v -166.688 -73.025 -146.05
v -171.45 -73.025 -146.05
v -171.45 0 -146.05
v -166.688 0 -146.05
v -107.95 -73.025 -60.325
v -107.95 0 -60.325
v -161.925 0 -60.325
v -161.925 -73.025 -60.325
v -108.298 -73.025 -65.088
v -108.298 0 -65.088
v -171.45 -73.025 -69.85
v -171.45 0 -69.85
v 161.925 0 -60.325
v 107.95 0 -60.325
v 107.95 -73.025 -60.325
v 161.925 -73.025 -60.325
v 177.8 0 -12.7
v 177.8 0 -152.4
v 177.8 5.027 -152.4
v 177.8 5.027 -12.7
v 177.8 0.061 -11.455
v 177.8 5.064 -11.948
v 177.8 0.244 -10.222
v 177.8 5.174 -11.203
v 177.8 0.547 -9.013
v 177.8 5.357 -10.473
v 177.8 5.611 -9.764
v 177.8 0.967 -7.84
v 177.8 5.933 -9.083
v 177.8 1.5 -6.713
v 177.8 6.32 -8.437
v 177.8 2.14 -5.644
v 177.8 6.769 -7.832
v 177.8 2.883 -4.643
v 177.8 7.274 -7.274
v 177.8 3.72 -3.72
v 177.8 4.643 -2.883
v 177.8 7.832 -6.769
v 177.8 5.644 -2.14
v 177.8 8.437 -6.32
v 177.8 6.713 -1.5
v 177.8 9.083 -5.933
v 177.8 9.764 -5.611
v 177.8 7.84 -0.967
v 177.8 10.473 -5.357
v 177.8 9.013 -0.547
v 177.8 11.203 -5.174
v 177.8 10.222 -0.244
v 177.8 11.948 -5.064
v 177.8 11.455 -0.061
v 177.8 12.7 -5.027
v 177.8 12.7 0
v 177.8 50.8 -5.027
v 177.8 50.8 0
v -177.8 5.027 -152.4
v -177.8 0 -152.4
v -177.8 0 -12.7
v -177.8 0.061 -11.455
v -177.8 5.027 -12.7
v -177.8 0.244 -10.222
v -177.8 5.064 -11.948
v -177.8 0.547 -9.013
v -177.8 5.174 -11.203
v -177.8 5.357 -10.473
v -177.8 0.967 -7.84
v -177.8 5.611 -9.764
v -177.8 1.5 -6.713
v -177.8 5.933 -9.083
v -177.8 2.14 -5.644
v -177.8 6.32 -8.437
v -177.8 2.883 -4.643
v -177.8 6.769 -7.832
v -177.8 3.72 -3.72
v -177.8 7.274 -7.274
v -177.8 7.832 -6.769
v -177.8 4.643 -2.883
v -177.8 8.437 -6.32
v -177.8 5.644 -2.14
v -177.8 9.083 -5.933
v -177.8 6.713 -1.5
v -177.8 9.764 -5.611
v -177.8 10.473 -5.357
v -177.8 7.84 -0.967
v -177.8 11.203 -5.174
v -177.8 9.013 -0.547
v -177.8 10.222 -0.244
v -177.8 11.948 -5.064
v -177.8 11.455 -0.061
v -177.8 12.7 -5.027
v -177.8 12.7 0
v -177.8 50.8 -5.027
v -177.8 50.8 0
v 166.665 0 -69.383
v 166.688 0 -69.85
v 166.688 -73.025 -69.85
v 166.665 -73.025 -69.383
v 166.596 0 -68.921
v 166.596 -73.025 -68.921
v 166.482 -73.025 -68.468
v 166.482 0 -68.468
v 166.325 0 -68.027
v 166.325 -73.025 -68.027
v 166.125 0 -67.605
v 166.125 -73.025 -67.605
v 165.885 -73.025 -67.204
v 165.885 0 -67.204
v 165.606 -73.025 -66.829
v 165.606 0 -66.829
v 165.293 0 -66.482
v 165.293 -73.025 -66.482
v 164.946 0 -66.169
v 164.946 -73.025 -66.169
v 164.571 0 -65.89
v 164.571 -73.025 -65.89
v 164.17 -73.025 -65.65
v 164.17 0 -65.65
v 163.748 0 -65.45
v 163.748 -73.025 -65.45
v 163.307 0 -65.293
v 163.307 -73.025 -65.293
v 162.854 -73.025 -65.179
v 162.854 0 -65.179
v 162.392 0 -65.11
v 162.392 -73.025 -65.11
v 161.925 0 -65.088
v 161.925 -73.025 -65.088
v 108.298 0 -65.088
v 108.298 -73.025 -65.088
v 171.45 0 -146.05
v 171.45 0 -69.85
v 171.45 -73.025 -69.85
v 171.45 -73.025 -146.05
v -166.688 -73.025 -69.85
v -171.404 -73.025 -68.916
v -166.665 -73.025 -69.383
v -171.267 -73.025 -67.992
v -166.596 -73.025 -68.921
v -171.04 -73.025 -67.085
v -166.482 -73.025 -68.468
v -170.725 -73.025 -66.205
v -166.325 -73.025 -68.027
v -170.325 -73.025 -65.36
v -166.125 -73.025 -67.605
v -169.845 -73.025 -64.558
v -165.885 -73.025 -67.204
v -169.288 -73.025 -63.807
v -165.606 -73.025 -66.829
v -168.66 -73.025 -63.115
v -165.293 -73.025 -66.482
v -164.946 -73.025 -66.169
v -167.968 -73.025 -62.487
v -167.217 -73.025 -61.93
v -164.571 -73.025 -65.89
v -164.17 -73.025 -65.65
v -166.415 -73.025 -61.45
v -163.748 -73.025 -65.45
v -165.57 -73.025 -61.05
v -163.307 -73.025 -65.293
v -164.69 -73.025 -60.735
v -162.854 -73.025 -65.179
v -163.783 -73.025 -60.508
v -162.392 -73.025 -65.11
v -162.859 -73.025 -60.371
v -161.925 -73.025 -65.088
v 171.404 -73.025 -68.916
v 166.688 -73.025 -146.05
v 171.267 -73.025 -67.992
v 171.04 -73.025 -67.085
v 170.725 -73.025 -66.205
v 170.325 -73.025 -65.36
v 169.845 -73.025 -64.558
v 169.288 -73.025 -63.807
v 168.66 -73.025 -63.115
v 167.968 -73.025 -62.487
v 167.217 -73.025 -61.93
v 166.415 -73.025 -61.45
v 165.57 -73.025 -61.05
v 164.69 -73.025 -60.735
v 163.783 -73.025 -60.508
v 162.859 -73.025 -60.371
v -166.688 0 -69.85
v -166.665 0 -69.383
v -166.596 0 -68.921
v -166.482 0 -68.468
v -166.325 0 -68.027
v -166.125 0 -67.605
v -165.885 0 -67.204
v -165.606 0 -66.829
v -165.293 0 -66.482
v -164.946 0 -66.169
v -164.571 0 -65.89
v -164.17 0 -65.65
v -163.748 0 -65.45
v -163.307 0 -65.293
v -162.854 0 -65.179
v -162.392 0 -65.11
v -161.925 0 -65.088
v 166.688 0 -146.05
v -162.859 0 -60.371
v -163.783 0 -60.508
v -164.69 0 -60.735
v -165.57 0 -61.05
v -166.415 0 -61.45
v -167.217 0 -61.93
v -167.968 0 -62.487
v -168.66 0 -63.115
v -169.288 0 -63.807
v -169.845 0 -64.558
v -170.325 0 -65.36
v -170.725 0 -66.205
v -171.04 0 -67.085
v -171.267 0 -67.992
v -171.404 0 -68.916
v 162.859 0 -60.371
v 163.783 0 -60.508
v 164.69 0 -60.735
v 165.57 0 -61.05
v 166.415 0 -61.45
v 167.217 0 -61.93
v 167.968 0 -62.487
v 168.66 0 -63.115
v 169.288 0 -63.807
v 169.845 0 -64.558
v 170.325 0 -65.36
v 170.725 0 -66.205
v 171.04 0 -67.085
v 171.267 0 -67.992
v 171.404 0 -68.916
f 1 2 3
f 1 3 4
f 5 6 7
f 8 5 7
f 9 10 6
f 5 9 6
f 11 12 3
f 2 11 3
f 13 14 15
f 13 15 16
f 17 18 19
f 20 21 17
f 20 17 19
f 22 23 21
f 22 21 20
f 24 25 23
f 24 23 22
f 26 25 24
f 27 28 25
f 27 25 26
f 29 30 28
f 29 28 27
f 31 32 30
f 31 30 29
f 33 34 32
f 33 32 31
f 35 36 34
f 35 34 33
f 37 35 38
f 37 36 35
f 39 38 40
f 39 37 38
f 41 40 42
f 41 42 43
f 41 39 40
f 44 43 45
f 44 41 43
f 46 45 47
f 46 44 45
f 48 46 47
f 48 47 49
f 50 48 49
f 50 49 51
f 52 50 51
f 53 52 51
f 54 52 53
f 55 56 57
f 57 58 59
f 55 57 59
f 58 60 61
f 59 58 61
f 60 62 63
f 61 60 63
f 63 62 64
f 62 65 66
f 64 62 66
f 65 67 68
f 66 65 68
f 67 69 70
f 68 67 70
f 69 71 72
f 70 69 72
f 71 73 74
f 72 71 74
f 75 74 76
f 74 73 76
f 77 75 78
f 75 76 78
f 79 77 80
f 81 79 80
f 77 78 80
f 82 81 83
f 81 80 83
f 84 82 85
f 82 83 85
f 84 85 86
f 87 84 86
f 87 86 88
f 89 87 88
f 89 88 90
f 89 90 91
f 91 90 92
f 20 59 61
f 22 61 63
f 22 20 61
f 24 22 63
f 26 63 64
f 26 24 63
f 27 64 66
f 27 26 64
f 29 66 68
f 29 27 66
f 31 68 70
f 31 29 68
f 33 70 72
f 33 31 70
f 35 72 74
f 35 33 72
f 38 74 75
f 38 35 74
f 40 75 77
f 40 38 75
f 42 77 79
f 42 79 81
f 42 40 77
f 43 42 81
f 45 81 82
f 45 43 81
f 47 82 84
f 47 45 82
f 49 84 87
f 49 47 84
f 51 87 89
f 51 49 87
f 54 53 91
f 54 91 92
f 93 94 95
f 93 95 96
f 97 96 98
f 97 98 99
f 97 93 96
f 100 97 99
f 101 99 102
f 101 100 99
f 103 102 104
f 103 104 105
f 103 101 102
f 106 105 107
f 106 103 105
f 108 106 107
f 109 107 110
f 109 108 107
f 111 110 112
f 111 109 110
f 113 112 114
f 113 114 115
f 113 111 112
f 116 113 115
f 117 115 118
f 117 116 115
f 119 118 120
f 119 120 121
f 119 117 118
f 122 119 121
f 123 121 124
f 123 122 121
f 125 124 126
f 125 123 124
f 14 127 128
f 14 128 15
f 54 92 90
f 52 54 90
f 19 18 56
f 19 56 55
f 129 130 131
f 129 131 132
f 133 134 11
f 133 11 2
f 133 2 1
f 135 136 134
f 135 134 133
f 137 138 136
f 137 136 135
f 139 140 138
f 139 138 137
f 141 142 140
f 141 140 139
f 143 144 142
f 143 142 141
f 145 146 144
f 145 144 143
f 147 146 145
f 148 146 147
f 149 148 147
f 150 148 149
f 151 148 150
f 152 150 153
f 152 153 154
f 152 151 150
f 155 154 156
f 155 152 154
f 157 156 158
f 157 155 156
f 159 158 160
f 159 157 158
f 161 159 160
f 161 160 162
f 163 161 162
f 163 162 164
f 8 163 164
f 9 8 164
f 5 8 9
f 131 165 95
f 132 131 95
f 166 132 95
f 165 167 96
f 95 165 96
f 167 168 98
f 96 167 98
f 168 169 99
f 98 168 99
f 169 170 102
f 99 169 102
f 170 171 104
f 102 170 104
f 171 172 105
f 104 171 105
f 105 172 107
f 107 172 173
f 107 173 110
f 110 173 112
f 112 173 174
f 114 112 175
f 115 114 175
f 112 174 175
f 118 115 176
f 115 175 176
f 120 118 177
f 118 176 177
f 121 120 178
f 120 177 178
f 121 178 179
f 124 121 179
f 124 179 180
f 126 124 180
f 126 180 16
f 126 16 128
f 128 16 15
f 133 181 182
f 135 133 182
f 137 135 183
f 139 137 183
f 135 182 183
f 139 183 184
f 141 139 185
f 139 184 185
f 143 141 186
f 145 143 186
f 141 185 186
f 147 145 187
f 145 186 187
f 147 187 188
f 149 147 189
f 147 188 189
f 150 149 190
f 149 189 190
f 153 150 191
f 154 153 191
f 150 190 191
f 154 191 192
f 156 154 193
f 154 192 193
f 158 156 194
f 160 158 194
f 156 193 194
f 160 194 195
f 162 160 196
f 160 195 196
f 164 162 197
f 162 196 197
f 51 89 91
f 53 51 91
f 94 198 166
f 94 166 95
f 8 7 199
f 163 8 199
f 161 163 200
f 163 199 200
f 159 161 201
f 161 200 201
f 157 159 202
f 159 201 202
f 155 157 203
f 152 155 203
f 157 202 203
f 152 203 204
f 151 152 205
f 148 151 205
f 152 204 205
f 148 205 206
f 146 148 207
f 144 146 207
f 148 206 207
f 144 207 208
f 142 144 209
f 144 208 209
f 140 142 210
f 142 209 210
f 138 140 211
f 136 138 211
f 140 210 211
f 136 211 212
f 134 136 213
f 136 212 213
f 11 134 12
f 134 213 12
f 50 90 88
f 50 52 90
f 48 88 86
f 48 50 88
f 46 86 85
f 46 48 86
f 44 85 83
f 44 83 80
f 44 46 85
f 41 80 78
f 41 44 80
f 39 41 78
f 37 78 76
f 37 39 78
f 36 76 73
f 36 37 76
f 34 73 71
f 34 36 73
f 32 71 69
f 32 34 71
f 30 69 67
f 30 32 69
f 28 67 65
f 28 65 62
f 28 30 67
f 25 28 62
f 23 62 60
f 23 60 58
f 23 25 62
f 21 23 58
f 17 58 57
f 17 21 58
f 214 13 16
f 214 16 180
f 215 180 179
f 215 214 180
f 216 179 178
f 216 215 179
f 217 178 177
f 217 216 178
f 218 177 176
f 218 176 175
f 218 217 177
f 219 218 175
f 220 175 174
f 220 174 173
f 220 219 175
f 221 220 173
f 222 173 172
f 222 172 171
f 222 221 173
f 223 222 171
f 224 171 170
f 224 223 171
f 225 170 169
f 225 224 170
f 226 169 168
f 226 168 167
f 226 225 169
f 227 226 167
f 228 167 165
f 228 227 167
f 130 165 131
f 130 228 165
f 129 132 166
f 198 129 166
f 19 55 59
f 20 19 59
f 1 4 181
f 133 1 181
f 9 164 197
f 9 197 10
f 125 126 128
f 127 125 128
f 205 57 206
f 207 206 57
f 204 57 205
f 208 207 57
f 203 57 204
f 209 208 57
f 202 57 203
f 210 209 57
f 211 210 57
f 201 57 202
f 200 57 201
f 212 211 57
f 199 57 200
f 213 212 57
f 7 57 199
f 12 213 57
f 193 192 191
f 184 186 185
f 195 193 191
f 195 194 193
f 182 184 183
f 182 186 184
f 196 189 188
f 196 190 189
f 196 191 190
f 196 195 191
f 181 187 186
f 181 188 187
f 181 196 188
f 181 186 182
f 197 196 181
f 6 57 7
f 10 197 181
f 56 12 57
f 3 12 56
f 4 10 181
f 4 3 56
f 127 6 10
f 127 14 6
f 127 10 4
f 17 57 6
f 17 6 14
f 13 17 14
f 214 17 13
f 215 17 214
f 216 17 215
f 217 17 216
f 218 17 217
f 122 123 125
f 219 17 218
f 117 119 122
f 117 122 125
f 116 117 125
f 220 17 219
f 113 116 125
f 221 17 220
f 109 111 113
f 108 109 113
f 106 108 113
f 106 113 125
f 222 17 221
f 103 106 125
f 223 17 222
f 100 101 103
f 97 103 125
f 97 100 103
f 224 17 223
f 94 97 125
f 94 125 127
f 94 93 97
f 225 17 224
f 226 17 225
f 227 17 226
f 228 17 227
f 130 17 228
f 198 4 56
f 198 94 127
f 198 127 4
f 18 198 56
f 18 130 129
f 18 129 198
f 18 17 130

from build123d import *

# Parameters (mm, degrees)
F1_DEPTH = 177.8
F3_DEPTH = 73.025


with BuildPart() as f1:
    # F0 (on Right) → F1 (new body, symmetric)
    with BuildSketch(Plane.YZ):
        with BuildLine():
            Line((0, -12.7), (0, -152.4))
            Line((0, -152.4), (5.0270461919, -152.4))
            Line((5.0270461919, -152.4), (5.0270461919, -12.7))
            ThreePointArc((5.0270461919, -12.7), (7.2744023306, -7.2744023306), (12.7, -5.0270461919))
            Line((12.7, -5.0270461919), (50.8, -5.0270461919))
            Line((50.8, -5.0270461919), (50.8, 0))
            Line((50.8, 0), (12.7, 0))
            ThreePointArc((12.7, 0), (3.7197438789, -3.7197438789), (0, -12.7))
        make_face()
    extrude(amount=F1_DEPTH, both=True)

    # F2 (on face) → F3 (join)
    with BuildSketch(Plane.XZ):
        with BuildLine():
            Line((-108.298035616, -65.0875), (-107.95, -60.325))
            Line((-107.95, -60.325), (-161.925, -60.325))
            ThreePointArc((-161.925, -60.325), (-168.6601920908, -63.1148079092), (-171.45, -69.85))
            Line((-171.45, -69.85), (-171.45, -146.05))
            Line((-171.45, -146.05), (-166.6875, -146.05))
            Line((-166.6875, -146.05), (-166.6875, -69.85))
            ThreePointArc((-166.6875, -69.85), (-165.2925960454, -66.4824039546), (-161.925, -65.0875))
            Line((-161.925, -65.0875), (-108.298035616, -65.0875))
        make_face()
    extrude(amount=F3_DEPTH)

    # F4: F1 across plane


with BuildPart() as f1_1:
    add(f1.part)
    add(f1.part.mirror(Plane.YZ))


solid = f1_1.part
